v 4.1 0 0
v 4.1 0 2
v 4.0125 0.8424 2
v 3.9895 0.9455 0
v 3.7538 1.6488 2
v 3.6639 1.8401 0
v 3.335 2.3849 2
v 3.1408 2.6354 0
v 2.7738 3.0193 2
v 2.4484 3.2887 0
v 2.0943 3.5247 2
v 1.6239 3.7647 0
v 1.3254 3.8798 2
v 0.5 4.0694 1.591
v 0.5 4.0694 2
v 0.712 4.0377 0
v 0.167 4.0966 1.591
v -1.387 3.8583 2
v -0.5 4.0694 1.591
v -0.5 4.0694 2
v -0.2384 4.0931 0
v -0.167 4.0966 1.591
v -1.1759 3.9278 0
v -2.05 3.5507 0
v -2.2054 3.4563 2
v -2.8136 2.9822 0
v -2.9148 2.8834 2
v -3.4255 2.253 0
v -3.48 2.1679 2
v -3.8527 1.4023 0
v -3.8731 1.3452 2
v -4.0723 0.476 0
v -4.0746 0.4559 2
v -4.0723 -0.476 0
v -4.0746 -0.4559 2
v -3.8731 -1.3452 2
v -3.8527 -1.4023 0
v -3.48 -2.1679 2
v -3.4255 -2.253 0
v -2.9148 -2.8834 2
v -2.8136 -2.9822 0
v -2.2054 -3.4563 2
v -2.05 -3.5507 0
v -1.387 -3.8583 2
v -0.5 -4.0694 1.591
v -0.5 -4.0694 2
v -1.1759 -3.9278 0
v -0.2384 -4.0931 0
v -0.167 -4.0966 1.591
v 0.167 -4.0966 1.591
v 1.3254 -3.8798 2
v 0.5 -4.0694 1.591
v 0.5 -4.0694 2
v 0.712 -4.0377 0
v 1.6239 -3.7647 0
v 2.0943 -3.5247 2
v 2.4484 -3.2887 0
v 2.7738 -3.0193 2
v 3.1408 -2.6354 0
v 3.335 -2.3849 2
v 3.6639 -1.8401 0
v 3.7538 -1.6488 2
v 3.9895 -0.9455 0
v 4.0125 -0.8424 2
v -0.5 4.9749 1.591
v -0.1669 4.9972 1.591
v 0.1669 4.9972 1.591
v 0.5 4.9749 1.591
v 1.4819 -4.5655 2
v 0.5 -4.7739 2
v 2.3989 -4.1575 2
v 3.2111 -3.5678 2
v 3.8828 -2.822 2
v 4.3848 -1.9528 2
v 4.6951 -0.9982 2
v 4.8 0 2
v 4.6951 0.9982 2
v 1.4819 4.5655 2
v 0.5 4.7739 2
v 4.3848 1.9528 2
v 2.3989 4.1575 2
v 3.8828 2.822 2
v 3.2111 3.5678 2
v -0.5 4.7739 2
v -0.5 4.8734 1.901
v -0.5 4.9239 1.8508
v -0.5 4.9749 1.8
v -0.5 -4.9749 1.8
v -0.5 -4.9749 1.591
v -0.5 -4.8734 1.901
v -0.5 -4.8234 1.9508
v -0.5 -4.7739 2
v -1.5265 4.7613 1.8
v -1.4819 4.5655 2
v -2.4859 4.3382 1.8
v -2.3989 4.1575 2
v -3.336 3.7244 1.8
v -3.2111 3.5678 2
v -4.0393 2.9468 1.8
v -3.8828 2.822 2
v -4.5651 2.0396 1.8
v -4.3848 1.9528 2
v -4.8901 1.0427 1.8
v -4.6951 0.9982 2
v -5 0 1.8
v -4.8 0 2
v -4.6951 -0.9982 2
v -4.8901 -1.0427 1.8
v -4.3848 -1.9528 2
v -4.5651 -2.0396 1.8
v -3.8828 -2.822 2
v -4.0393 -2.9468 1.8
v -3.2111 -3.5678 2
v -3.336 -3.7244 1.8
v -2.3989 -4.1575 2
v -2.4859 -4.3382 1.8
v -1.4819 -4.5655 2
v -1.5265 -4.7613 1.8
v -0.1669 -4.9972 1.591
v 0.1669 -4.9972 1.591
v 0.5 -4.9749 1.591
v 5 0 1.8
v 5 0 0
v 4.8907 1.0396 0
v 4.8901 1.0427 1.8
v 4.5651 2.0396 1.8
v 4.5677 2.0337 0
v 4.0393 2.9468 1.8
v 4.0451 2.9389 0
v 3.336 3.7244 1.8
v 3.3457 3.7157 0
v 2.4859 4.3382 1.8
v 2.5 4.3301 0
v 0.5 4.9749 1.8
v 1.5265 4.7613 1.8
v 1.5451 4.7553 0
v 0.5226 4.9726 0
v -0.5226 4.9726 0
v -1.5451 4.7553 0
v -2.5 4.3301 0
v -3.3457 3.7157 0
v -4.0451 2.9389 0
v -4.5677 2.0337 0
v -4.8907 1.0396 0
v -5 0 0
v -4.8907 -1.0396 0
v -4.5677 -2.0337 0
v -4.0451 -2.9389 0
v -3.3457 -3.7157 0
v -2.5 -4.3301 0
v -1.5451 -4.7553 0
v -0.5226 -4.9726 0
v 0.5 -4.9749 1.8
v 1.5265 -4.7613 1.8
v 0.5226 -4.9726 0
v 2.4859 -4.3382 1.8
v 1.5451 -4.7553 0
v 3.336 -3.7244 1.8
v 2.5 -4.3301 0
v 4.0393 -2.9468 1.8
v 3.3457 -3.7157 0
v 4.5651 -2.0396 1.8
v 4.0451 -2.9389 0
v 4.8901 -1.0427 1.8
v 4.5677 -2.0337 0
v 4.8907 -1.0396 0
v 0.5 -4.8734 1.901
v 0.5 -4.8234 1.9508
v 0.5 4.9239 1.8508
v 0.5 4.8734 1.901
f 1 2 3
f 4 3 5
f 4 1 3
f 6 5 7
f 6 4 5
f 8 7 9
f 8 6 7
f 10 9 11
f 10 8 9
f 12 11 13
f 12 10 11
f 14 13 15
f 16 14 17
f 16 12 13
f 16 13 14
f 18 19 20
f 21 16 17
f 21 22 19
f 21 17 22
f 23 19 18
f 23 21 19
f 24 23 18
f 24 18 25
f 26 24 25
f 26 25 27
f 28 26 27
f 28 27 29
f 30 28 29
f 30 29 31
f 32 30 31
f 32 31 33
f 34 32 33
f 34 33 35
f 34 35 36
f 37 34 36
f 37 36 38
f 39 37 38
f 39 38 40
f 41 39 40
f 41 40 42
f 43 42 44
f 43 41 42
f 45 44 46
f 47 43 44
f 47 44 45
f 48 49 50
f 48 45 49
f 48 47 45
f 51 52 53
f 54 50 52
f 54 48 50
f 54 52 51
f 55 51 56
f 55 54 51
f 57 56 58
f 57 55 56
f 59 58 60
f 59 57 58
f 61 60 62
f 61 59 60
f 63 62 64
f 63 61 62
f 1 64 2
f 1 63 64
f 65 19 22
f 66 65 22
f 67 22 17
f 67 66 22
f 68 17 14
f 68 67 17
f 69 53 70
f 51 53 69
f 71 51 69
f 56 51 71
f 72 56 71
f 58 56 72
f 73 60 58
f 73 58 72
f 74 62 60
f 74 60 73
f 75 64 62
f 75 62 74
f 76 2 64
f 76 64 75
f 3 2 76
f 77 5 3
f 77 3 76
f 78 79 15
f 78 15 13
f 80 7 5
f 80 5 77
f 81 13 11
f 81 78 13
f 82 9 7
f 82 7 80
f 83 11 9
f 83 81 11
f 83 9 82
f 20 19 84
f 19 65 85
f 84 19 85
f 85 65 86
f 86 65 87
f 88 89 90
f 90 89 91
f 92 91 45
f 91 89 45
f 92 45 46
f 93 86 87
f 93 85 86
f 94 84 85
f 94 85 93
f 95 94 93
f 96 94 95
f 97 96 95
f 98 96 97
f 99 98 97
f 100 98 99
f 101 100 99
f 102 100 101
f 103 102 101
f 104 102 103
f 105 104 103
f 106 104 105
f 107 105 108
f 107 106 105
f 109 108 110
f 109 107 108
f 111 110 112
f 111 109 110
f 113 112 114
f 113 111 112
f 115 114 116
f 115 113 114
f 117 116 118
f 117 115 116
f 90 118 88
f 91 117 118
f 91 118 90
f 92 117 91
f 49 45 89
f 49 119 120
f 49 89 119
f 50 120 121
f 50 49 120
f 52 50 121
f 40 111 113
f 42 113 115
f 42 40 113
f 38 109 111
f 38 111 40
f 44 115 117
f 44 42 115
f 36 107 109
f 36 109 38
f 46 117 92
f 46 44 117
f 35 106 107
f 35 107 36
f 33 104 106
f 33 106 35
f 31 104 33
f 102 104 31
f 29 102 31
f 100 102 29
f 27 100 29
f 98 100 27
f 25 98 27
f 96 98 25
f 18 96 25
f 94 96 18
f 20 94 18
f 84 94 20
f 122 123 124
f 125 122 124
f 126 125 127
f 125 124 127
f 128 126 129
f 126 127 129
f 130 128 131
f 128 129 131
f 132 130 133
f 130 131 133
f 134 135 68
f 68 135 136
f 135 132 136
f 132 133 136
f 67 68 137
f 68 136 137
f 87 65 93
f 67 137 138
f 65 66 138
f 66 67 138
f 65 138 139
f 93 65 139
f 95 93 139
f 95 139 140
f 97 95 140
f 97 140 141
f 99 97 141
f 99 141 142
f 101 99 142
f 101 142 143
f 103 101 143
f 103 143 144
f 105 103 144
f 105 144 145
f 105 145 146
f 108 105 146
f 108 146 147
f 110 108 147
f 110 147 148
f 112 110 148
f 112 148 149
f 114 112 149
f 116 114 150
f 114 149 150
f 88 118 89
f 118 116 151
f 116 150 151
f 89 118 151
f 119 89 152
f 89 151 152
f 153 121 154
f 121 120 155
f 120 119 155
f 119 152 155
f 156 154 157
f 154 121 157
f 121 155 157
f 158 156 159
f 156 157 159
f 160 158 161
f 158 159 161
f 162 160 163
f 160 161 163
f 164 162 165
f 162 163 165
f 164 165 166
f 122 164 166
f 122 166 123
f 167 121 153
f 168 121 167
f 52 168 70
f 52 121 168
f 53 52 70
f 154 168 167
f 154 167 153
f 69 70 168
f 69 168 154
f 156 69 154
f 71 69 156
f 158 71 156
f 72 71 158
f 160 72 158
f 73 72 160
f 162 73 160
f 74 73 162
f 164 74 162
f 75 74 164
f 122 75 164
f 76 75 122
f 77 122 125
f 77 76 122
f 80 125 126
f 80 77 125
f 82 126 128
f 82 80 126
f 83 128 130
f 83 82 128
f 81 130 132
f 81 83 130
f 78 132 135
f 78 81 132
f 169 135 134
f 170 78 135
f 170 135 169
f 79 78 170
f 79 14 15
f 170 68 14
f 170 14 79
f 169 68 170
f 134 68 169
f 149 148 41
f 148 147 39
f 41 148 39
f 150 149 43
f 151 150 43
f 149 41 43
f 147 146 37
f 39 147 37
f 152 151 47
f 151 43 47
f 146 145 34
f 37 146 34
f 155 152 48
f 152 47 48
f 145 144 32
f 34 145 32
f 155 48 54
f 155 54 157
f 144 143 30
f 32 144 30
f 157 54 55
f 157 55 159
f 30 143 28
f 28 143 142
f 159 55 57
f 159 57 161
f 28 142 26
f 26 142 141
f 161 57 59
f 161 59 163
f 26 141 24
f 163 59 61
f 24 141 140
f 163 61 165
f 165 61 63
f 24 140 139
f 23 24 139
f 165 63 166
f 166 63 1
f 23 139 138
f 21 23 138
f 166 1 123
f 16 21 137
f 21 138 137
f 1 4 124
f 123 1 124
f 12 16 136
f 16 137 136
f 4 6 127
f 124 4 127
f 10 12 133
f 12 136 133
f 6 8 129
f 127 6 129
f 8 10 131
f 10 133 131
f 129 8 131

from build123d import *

# Parameters (mm, degrees)
F0_R     = 5
F0_R_2   = 4.1
F1_DEPTH = 2
F2_SIZE  = 0.2
F3_W     = 1
F3_H     = 0.5
F4_DEPTH = 25


with BuildPart() as f1:
    # F0 (on Top) → F1 (new body)
    with BuildSketch(Plane.XY):
        Circle(F0_R)
        Circle(F0_R_2, mode=Mode.SUBTRACT)
    extrude(amount=F1_DEPTH)

    # F2
    f2_edges = [f1.edges().sort_by_distance(p)[0] for p in [
        (-5, 0, 2),
    ]]
    chamfer(f2_edges, length=F2_SIZE)


with BuildPart() as f4:
    # F3 (on Front) → F4 (new body)
    with BuildSketch(Plane.XZ):
        with Locations((0.5, 1.840964)):
            Rectangle(F3_W, F3_H)
    extrude(amount=F4_DEPTH)


with BuildPart() as f4_1:
    # F5: moved
    add(f4.part.moved(Location((-0.5, 13.3, 0))))


with BuildPart() as f1_1:
    add(f1.part)

    # F6: cut F4
    add(f4_1.part, mode=Mode.SUBTRACT)


solid = f1_1.part
